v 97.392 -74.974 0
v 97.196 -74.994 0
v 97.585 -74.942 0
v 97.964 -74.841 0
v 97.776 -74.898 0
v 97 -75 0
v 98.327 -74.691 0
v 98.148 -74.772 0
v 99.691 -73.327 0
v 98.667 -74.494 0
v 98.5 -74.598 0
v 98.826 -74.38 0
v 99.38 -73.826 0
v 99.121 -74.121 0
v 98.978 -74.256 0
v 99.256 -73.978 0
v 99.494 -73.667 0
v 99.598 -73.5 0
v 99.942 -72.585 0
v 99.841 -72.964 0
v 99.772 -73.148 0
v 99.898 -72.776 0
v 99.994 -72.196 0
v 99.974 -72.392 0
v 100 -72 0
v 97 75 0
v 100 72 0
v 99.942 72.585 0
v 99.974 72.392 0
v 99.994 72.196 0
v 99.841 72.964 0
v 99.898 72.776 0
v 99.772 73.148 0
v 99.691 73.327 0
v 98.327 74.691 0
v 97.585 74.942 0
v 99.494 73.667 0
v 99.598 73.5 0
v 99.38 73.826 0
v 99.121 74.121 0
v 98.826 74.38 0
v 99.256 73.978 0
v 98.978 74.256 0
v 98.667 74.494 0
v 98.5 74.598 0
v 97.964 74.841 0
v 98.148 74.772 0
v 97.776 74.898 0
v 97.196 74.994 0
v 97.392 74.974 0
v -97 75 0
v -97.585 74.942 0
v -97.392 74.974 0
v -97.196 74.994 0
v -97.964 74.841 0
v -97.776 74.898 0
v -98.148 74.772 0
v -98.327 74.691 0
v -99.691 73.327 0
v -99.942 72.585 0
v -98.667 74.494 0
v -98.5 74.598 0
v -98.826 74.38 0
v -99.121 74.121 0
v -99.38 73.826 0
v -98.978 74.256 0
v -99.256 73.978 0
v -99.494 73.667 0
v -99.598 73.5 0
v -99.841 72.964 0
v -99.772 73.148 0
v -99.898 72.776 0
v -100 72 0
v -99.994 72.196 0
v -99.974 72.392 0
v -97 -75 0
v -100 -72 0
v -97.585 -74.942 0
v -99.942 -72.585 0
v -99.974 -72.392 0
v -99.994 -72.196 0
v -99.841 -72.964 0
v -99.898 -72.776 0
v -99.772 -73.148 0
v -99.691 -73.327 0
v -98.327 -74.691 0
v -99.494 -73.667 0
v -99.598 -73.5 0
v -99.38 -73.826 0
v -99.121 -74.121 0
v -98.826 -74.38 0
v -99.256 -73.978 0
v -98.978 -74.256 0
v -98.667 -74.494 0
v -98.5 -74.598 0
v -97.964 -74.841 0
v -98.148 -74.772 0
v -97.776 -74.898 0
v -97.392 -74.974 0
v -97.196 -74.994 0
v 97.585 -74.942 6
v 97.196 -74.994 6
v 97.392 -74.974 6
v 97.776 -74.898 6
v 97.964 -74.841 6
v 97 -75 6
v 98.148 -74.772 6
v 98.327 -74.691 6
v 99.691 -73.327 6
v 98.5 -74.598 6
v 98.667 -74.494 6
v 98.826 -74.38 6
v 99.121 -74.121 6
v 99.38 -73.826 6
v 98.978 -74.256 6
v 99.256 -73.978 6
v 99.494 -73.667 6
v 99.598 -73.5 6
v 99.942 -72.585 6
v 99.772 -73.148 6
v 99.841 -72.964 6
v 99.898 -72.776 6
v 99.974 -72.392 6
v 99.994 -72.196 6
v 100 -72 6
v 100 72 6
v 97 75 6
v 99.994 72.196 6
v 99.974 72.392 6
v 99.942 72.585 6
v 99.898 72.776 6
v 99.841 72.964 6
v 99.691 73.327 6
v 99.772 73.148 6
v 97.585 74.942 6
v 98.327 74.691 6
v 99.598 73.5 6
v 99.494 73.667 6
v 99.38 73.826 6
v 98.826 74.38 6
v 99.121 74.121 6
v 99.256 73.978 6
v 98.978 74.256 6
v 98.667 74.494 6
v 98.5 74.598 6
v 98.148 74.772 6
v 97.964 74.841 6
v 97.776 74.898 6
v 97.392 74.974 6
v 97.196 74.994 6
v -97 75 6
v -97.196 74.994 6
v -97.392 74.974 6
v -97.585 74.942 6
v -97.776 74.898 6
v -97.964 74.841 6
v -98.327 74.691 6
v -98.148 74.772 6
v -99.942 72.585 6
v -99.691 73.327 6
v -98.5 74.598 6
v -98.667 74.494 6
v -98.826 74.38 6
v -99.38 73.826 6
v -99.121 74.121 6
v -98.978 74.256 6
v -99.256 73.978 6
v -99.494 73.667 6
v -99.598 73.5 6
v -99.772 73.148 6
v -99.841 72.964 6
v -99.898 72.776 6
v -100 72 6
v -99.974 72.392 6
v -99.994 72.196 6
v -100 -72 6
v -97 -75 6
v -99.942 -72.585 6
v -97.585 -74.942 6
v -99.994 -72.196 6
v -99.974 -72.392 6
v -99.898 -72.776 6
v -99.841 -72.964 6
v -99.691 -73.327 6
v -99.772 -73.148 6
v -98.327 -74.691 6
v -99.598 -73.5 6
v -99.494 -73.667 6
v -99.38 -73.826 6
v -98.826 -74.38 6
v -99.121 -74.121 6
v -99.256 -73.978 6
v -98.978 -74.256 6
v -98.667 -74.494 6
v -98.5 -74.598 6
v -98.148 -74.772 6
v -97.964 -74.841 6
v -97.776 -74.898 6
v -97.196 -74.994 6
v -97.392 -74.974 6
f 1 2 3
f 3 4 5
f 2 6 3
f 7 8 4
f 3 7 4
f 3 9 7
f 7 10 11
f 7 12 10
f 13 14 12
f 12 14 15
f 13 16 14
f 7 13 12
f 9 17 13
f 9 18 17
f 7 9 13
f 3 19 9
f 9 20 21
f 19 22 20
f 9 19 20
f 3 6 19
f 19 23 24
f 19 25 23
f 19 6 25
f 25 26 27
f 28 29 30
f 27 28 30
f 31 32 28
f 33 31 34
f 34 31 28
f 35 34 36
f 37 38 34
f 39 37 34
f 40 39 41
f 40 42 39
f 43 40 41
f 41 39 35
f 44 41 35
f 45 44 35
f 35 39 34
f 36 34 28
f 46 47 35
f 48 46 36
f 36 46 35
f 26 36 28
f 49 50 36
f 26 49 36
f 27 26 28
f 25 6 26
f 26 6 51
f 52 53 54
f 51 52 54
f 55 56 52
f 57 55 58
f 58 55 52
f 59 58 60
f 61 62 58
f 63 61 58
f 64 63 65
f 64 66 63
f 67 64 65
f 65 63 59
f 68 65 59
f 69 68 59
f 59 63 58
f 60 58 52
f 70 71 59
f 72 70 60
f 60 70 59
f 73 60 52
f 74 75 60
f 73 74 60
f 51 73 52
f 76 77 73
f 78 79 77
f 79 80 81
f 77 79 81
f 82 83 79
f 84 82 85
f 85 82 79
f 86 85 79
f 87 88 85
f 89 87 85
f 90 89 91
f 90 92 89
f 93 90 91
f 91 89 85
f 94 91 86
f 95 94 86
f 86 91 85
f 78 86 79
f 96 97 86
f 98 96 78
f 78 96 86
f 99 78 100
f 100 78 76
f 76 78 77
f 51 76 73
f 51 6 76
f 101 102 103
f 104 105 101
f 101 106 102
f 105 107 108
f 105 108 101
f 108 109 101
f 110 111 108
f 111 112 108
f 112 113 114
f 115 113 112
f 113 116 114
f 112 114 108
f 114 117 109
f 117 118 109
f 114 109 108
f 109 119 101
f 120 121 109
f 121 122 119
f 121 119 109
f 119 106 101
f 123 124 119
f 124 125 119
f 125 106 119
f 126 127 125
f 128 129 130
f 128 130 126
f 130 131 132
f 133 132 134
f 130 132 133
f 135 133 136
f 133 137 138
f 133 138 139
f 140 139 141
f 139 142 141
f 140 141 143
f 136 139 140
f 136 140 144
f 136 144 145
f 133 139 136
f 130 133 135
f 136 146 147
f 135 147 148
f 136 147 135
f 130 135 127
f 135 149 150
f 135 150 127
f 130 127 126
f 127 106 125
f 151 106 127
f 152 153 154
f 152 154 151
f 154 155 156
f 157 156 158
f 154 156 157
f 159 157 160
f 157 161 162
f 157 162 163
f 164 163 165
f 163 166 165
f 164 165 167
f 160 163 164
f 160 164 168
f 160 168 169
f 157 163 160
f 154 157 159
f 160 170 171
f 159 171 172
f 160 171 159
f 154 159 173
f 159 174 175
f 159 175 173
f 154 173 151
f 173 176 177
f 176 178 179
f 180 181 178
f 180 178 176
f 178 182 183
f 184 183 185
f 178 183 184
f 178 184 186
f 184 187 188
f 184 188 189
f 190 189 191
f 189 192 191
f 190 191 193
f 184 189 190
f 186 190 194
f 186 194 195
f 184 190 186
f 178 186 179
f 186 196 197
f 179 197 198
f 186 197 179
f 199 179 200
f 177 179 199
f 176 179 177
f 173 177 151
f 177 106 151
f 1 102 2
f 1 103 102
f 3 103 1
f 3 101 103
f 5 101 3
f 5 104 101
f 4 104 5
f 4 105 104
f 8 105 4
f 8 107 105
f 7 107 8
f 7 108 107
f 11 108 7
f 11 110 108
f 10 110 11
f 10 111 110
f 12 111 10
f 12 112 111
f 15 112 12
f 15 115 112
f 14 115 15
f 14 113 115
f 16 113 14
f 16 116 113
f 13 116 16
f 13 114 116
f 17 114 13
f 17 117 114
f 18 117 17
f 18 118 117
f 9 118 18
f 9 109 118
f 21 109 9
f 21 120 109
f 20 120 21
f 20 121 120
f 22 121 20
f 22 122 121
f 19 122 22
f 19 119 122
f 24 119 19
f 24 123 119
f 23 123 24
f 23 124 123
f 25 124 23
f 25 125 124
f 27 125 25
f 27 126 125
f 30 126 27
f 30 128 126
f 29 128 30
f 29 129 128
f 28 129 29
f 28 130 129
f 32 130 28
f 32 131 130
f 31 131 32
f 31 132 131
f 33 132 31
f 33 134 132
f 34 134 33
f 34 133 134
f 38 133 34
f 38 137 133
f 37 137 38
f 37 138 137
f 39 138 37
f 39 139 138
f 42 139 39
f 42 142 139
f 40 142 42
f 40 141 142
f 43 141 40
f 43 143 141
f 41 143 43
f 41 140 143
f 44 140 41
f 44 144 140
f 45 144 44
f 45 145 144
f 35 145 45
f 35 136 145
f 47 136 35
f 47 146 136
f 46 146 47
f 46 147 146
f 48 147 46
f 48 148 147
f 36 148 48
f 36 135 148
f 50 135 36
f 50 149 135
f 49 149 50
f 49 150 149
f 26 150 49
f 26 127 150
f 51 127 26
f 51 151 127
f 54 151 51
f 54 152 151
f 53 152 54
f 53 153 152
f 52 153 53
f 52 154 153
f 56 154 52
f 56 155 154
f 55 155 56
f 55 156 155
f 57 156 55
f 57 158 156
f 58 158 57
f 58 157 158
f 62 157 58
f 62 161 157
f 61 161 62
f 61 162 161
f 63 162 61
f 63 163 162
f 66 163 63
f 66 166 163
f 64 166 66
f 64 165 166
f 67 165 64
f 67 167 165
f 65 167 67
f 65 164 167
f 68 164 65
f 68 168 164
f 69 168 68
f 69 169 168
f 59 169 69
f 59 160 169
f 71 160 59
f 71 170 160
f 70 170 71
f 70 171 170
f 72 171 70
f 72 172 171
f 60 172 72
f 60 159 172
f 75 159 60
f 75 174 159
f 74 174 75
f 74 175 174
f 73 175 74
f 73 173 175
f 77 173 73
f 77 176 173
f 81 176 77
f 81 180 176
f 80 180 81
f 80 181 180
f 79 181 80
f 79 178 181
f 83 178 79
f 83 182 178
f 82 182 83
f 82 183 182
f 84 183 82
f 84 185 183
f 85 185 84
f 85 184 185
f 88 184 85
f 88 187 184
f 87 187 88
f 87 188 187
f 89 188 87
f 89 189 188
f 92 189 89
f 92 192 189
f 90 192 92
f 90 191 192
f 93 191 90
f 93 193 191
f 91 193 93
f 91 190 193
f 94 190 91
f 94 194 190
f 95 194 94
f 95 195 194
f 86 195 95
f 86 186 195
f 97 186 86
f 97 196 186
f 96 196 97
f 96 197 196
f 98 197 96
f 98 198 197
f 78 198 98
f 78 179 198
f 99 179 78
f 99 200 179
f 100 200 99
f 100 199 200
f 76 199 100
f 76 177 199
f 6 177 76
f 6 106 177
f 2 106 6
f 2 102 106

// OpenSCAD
$fn = 96;

length = 200;
width  = 150;
thickness = 6;

corner_radius = 3;

module rounded_plate(l, w, t, r){
    r2 = min(r, min(l, w)/2);
    linear_extrude(height = t)
        offset(r = r2)
            square([l - 2*r2, w - 2*r2], center = true);
}

color([0.75, 0.77, 0.80])
    rounded_plate(length, width, thickness, corner_radius);
